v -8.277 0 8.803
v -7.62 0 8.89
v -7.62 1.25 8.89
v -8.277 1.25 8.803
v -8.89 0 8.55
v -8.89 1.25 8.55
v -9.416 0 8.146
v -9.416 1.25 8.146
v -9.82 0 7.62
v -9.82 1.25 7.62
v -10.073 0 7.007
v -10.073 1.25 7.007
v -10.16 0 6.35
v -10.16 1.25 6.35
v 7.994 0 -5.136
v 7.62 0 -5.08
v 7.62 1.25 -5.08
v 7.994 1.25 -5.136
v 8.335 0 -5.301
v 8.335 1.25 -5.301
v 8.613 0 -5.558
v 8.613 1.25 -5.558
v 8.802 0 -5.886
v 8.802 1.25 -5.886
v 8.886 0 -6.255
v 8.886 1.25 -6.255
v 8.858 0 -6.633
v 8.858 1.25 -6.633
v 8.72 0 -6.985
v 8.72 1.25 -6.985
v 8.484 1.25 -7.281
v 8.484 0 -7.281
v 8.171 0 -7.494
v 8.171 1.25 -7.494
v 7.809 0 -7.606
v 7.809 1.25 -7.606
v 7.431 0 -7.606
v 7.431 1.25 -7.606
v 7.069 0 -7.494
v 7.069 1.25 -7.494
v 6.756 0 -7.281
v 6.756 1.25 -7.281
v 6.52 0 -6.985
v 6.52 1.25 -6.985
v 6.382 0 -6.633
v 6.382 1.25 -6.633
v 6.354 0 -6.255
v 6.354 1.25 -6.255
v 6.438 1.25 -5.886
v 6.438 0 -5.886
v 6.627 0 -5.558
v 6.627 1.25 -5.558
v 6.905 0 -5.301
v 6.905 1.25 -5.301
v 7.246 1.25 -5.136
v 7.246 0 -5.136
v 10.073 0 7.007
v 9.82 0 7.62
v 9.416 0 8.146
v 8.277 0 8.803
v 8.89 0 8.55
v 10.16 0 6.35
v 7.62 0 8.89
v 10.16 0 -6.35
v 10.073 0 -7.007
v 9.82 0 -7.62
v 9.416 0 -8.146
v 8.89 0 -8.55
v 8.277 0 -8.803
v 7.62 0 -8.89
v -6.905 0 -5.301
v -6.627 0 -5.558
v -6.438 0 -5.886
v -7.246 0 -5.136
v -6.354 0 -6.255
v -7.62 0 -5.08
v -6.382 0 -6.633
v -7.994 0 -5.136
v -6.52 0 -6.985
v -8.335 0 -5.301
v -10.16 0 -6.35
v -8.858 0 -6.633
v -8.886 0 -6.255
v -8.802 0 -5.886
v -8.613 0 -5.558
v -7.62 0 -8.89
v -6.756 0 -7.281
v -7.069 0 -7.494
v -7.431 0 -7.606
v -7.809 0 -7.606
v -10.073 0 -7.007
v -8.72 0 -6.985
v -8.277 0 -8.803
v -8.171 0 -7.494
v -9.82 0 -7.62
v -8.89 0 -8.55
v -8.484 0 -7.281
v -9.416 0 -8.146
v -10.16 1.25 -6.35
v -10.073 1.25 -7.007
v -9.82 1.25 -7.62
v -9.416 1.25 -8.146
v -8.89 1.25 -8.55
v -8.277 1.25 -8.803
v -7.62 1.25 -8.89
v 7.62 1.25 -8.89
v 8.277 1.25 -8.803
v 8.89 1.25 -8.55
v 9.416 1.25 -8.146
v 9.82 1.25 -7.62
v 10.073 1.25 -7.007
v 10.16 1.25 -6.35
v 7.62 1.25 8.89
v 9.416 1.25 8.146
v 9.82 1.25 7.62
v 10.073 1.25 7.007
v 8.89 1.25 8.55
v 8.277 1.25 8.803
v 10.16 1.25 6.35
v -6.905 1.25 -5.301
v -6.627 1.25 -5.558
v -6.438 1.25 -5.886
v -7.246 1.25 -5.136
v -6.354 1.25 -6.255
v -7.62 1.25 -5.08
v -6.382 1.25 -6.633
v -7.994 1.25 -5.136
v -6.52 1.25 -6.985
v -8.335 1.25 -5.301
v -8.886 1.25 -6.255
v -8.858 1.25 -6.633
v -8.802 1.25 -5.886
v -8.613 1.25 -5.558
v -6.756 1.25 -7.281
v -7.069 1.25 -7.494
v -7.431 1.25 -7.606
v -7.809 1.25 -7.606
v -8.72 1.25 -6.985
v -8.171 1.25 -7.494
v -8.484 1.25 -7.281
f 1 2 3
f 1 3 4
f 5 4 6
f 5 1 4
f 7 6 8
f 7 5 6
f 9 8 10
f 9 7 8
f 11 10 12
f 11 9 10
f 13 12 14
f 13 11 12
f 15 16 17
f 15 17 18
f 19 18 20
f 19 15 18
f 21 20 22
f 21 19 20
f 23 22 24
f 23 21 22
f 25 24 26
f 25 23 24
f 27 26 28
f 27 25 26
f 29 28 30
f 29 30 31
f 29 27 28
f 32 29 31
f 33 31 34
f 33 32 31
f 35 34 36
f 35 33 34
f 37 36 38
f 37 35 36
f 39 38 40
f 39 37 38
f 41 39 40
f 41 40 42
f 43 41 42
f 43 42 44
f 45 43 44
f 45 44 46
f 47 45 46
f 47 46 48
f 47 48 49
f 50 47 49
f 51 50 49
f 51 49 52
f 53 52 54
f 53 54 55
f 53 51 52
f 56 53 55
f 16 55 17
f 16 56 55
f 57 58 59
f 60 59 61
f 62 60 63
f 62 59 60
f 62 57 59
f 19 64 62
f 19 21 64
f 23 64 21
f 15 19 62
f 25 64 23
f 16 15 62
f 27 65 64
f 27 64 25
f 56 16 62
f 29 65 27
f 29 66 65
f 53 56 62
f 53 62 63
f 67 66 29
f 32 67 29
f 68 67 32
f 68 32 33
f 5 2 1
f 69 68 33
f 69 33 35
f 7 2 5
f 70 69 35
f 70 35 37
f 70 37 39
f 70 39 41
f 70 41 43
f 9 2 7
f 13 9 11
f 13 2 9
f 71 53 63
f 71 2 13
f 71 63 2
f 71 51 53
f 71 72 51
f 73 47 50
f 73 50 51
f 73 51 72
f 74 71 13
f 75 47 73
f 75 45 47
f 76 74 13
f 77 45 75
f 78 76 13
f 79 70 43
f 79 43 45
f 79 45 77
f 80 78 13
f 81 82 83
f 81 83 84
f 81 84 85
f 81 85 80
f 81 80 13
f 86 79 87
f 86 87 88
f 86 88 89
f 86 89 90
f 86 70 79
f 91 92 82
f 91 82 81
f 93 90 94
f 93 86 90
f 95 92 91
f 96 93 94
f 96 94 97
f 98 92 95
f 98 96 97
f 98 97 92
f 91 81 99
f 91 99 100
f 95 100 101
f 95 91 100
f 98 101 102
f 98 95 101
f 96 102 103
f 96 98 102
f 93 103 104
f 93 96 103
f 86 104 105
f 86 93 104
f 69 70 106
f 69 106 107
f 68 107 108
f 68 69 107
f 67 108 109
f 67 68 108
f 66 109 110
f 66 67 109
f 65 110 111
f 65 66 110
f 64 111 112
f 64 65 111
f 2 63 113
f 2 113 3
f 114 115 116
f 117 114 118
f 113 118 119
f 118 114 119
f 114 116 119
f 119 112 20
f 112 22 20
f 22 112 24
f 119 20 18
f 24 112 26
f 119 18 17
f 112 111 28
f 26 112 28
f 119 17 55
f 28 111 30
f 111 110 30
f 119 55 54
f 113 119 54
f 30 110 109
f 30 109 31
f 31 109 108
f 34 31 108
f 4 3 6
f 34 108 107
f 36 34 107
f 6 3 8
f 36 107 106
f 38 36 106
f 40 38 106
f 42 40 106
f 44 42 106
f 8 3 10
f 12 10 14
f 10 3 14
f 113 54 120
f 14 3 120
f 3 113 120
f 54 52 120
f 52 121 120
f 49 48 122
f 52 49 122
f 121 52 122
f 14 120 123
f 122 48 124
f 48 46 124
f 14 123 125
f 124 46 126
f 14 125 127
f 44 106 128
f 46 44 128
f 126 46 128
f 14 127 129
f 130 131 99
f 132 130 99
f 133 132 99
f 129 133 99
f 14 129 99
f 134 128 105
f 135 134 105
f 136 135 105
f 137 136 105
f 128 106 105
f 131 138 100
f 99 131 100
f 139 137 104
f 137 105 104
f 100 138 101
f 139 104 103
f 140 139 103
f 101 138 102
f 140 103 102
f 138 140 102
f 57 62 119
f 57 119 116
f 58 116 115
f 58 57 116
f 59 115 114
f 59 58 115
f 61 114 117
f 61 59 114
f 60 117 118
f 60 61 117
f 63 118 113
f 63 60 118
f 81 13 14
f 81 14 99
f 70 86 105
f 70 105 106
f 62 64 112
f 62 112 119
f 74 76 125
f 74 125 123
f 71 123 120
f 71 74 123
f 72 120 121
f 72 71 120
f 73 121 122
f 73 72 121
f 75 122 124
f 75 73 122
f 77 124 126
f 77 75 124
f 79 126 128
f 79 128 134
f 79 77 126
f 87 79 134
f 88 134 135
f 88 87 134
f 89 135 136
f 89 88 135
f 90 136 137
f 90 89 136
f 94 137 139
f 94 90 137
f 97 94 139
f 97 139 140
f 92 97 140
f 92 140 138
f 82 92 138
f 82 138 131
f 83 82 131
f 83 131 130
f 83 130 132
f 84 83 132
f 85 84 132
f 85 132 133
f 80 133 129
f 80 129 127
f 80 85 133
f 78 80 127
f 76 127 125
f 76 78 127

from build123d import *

# Parameters (mm, degrees)
SKETCH1_R           = 1.27
BOSS_EXTRUDE1_DEPTH = 1.25


with BuildPart() as part:
    # Sketch1 → Boss-Extrude1 (new body)
    with BuildSketch(Plane(origin=(0, 0, 0), x_dir=(1, 0, 0), z_dir=(0, 1, 0))):
        with BuildLine():
            ThreePointArc((-7.62, -8.89), (-9.416051224, -8.146051224), (-10.16, -6.35))
            Line((-10.16, -6.35), (-10.16, 6.35))
            ThreePointArc((-10.16, 6.35), (-9.416051224, 8.146051224), (-7.62, 8.89))
            Line((-7.62, 8.89), (7.62, 8.89))
            ThreePointArc((7.62, 8.89), (9.416051224, 8.146051224), (10.16, 6.35))
            Line((10.16, 6.35), (10.16, -6.35))
            ThreePointArc((10.16, -6.35), (9.416051224, -8.146051224), (7.62, -8.89))
            Line((7.62, -8.89), (-7.62, -8.89))
        make_face()
        with Locations(Location((7.62, 6.35, 0), (0, 0, 270))):
            Circle(SKETCH1_R, mode=Mode.SUBTRACT)
        with Locations(Location((-7.62, 6.35, 0), (0, 0, 270))):
            Circle(SKETCH1_R, mode=Mode.SUBTRACT)
    extrude(amount=BOSS_EXTRUDE1_DEPTH)


solid = part.part
